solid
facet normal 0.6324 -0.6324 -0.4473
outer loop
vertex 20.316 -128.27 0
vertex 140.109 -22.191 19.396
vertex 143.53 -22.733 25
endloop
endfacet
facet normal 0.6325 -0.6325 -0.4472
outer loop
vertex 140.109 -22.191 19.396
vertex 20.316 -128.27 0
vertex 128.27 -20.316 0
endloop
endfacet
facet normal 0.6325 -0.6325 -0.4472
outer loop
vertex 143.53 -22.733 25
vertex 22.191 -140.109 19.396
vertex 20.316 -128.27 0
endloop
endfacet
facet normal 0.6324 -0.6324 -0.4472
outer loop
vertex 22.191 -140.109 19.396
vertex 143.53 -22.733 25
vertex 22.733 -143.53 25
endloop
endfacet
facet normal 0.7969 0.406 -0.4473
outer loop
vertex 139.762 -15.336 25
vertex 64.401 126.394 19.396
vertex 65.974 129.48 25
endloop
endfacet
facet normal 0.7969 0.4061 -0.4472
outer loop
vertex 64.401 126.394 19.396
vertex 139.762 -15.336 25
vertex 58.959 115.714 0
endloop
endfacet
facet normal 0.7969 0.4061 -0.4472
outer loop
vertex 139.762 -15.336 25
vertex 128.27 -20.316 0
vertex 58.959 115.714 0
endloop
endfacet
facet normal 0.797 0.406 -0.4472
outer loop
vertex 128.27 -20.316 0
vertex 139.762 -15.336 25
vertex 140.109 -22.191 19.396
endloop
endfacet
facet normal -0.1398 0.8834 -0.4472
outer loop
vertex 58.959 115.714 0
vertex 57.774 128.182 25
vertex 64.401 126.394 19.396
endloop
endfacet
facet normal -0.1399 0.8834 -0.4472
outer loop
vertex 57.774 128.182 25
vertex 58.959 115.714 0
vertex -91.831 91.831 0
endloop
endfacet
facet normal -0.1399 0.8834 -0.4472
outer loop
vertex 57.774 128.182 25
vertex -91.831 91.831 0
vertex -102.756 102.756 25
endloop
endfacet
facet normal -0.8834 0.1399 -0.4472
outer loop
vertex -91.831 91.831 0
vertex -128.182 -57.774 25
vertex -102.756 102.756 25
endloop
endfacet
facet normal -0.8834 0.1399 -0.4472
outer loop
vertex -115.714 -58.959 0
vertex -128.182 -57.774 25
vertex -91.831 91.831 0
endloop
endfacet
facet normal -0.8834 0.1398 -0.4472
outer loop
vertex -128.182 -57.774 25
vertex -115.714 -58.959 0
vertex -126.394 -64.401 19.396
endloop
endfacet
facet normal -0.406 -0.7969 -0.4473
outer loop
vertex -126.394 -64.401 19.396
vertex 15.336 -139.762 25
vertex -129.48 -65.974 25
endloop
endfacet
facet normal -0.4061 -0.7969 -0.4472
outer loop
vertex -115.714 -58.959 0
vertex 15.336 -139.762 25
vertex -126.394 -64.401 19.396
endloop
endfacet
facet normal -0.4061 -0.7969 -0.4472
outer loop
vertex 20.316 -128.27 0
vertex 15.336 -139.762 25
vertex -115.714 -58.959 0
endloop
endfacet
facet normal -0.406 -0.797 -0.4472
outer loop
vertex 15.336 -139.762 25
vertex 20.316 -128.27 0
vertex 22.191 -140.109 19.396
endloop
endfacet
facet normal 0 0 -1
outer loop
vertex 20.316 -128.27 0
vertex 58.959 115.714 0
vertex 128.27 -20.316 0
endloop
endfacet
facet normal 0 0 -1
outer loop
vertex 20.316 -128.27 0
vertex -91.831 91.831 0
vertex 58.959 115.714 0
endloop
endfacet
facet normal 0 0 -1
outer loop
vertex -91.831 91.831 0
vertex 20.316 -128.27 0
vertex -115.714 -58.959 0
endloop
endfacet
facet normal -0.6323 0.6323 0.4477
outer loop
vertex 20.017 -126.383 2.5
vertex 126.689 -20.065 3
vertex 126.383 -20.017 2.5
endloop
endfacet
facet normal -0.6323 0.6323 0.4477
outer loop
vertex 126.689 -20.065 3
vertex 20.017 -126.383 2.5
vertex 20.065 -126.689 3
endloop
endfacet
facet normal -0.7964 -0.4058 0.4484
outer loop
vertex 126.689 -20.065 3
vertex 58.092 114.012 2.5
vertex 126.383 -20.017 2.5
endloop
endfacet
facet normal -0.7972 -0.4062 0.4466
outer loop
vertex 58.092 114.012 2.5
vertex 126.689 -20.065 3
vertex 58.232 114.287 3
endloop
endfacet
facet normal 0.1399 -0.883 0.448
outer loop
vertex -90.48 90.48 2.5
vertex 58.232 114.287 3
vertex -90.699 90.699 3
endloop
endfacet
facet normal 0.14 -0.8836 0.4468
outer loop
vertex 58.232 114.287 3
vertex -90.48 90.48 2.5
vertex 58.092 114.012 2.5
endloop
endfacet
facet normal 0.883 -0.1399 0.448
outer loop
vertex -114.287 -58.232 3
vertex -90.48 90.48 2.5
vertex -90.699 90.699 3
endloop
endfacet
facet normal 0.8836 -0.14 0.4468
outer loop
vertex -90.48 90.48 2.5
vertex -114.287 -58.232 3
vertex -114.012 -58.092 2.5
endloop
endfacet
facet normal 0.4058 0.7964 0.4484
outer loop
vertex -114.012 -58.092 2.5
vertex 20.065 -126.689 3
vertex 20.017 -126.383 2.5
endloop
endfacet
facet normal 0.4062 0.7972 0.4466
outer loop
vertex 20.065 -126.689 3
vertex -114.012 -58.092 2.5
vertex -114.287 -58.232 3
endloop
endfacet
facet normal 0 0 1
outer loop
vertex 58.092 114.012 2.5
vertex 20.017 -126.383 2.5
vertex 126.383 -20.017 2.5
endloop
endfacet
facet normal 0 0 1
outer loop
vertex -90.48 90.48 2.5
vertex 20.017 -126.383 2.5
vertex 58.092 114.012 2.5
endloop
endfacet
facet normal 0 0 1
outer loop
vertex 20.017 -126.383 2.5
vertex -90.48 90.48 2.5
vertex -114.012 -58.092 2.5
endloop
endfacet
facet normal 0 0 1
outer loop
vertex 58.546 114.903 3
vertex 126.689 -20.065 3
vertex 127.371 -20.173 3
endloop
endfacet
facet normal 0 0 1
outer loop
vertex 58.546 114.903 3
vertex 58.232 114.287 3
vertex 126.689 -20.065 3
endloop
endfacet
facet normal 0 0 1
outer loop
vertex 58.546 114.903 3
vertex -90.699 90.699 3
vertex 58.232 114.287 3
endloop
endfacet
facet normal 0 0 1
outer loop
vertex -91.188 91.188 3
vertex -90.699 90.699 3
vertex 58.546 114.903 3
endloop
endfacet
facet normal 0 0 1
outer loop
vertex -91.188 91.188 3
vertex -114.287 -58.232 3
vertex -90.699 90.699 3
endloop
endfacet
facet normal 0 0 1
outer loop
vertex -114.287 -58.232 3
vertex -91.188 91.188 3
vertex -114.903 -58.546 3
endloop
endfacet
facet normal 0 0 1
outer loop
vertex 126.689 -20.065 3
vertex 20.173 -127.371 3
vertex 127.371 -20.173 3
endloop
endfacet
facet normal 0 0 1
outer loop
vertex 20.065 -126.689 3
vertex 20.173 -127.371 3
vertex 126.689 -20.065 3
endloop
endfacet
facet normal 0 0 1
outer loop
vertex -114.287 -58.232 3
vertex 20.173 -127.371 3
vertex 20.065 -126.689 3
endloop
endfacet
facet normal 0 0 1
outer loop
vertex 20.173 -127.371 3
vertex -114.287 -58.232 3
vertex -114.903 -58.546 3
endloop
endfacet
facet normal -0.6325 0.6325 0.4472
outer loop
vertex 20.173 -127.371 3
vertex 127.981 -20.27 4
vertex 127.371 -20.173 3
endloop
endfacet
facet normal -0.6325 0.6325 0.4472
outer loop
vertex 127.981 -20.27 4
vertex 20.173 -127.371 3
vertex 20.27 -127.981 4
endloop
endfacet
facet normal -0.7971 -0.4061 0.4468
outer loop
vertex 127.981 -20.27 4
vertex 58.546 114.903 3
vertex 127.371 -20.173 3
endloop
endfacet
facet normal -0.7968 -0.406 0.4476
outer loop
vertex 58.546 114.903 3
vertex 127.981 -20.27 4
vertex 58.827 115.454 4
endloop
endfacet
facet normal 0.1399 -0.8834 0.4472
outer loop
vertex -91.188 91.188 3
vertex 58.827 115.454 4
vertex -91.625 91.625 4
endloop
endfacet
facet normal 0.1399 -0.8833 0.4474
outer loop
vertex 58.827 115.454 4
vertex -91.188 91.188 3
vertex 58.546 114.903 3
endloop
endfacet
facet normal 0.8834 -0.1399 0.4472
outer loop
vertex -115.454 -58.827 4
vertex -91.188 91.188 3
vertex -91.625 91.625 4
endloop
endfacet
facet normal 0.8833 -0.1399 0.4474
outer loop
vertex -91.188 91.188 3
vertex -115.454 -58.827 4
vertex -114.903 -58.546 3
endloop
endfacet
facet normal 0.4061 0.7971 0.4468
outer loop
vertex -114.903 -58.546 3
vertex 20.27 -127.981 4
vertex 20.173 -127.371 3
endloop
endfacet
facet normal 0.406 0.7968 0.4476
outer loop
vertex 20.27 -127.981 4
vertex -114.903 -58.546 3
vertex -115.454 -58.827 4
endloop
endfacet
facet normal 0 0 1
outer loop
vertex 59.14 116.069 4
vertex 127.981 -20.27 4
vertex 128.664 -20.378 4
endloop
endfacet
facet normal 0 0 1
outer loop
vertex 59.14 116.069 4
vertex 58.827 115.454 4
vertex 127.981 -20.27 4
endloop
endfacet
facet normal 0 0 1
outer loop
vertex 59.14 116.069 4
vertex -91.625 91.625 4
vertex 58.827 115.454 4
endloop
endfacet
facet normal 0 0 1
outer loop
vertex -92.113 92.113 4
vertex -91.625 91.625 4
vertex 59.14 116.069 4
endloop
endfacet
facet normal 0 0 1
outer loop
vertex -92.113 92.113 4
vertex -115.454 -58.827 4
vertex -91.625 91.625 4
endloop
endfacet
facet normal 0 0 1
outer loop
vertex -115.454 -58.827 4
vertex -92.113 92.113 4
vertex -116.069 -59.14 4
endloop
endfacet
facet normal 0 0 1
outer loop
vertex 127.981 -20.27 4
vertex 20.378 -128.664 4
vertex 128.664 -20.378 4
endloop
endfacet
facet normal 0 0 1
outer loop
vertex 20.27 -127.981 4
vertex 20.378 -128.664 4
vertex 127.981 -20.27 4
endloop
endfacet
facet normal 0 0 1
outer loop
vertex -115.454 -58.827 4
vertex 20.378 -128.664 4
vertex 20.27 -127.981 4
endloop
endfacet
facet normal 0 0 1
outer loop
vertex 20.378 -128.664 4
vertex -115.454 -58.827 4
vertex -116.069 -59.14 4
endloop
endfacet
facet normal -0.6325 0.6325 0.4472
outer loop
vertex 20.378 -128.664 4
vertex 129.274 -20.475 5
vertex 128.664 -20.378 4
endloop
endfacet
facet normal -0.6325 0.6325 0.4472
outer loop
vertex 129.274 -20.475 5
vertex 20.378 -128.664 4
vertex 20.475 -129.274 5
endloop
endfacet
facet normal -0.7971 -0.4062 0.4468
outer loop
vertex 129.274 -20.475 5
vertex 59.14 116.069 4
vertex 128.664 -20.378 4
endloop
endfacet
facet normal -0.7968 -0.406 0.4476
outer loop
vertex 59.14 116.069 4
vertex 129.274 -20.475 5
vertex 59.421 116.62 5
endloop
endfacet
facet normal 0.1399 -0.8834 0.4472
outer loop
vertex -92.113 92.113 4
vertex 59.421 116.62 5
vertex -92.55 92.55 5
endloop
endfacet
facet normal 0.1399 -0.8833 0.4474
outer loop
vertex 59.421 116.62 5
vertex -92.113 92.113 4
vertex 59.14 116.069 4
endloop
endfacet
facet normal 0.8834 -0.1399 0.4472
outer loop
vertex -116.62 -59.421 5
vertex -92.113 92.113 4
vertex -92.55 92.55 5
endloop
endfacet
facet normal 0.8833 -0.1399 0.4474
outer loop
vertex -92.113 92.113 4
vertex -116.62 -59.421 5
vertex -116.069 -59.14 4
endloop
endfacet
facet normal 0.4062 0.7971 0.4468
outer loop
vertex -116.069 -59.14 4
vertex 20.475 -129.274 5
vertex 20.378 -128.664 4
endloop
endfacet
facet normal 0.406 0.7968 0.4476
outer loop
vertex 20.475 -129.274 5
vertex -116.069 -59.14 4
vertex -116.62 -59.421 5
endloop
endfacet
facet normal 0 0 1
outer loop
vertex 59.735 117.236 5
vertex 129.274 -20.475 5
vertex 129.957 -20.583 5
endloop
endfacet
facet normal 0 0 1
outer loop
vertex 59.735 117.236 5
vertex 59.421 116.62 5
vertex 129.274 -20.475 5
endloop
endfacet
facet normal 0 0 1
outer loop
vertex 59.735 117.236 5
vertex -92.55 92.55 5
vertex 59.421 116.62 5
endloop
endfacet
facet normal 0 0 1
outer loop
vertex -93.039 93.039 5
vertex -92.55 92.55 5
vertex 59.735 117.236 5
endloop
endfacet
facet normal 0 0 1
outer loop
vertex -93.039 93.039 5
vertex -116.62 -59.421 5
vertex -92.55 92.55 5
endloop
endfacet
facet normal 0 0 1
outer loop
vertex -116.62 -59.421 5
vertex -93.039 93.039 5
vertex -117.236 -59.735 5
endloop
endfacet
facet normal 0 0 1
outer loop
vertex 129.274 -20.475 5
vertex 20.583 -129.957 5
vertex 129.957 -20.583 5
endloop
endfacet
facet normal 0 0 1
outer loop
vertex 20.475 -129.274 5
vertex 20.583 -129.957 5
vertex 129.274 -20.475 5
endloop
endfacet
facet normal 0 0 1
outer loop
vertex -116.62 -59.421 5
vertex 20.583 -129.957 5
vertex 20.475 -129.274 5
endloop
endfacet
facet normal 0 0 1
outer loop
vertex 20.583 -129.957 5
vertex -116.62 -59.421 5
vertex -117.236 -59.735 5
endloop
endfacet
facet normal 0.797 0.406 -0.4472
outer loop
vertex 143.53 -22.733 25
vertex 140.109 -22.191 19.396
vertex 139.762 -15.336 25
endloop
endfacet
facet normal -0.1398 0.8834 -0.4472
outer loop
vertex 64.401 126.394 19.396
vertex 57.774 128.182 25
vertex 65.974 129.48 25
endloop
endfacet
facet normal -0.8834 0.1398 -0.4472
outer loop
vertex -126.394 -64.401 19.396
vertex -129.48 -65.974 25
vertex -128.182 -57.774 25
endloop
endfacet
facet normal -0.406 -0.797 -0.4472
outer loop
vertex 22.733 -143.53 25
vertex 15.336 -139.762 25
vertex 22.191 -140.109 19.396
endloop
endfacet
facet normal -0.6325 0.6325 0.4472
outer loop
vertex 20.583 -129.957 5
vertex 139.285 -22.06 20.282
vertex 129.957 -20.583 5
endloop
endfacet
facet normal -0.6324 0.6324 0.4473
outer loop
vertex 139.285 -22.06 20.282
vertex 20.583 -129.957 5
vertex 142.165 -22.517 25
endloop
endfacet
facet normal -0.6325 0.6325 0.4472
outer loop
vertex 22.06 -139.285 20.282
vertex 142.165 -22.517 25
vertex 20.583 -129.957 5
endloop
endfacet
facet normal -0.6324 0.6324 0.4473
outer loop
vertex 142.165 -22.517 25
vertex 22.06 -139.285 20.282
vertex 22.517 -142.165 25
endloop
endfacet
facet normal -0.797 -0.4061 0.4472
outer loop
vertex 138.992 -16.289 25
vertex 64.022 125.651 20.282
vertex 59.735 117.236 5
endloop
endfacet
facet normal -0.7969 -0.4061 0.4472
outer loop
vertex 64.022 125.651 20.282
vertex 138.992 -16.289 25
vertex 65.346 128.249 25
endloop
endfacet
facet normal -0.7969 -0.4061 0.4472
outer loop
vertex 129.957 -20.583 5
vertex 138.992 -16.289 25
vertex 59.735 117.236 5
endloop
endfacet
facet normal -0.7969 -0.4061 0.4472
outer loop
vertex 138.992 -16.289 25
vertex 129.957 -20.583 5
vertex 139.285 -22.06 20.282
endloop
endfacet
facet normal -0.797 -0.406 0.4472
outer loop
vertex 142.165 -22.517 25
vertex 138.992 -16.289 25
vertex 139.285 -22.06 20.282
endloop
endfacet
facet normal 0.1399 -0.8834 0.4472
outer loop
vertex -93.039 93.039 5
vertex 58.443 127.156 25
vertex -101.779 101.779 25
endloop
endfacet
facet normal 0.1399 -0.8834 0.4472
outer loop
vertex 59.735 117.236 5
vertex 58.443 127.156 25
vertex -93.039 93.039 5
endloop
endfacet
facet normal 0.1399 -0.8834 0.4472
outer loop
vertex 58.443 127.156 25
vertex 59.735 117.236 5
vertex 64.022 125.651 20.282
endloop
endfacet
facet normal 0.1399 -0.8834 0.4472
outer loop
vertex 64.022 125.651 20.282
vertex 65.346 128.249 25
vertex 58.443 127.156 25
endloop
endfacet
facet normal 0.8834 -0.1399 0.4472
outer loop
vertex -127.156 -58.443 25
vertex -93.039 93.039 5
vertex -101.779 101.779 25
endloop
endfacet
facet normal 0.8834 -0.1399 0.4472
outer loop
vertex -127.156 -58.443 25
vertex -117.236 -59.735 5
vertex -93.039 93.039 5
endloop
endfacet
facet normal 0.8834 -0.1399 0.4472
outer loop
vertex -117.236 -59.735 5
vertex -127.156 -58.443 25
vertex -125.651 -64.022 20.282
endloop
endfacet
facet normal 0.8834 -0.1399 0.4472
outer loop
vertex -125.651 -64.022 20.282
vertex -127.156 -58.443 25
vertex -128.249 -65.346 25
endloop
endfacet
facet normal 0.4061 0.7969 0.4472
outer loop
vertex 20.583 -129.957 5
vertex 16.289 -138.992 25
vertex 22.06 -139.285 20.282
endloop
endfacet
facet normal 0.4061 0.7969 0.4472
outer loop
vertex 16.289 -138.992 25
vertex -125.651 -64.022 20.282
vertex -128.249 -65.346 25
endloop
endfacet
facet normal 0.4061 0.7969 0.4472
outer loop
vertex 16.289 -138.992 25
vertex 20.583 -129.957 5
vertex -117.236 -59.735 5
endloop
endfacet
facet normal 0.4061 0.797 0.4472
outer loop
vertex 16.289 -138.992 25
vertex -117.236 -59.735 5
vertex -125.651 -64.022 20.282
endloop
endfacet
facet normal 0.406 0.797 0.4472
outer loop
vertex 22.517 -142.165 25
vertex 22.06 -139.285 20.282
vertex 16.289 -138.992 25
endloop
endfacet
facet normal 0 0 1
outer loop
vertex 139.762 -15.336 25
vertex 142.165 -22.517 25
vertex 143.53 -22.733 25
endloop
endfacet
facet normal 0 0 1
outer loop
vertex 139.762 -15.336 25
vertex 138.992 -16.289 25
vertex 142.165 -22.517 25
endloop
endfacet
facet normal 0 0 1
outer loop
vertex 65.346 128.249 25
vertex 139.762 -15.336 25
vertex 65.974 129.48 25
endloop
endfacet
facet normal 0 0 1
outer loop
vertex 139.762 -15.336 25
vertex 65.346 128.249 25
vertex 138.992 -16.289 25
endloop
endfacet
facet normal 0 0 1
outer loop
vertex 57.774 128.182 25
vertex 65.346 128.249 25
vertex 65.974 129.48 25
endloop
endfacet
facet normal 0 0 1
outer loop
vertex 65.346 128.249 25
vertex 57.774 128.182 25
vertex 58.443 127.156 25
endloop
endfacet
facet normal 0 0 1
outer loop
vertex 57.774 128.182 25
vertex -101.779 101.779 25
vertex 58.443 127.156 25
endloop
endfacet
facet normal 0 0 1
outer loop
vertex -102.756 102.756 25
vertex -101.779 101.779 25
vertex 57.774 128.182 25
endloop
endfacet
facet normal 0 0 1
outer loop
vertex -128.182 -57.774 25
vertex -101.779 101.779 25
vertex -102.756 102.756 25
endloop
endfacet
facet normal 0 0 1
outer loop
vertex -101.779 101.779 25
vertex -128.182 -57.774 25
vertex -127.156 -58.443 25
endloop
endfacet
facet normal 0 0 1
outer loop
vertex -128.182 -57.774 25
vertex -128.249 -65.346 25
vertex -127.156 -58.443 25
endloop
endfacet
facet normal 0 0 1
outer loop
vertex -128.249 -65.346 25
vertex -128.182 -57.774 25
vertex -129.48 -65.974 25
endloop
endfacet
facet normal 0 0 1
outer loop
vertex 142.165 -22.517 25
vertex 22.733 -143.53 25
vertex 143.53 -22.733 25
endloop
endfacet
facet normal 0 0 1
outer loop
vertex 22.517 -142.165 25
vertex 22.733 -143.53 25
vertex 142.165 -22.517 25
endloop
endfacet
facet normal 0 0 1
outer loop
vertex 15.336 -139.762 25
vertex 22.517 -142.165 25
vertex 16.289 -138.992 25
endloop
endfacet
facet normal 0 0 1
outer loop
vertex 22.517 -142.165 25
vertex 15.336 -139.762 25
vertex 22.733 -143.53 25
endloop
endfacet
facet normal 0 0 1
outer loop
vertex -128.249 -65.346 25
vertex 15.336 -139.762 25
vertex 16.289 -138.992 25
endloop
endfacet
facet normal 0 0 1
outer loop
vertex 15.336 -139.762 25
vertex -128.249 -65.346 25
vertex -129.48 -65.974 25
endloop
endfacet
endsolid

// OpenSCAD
/*
 * Customizable Lamp Shade - https://www.thingiverse.com/thing:2372190
 * by Dennis Hofmann - https://www.thingiverse.com/mightynozzle/about
 * created 2017-06-08
 * version v1.0
 *
 * This work is licensed under the Creative Commons - Attribution - Non-Commercial license.
 * https://creativecommons.org/licenses/by-nc/3.0/
*/


 // Parameter Section//
//------------------//

// choose the shape of the lamp shade
lamp_shape = "dodecahedron"; //[simple,sphere,flower,dodecahedron]

// [Simple, sphere and flower shape] Resolution of round shapes. You can also use this value as the number of edges of the simple shade. If you want a cube or a pyramide, set the value of 4. If you want a cylinder or a cone, set the value of 100-255. Create a star shape with the flower shape with resolution of 3-5. Minimum value for a sphere shape is 7. You can use a low resolution (e.g. 16-32) to create a low polygon style. You can create some interesting shapes with this parameter. Just try some different values!
resolution = 64; //[3:255]

// Thinner for more translucency, thicker for more stable lamp shade. Default: 1.0
shell_thickness_in_millimeter = 1.0;

// [All lamp shapes] Set the diameter of the base of the lamp shade. The base is the position, where the bulb fitting is located. This parameter is used for all lamp shapes.
lamp_shade_base_diameter_in_millimeter = 340.0; //[1:300]

// [Simple and flower shape] Set the diameter of the head of the lamp shade. The head is the top position of the lamp shade. If this value is higher or lower than the base diameter, you get a cone or pyramide. Lower value can be used for desk lamp, higher value can be used for ceiling lamp. This parameter is used for simple and flower shape.
lamp_shade_head_diameter_in_millimeter = 10.0; //[1:300]

// [Simple and flower shape] Set the height of the lamp shade. This parameter is used for simple and flower shape
lamp_shade_height_in_millimeter = 110.0; //[1:300]

// [Sphere and dodecahedron shape] Set the cut height of the head of the shape. 0 means a closed top. It is like sclicing the top of an apple with a knife. This parameter is used for sphere and dodecahedron shape.
head_cut_height_in_millimeter = 315.0; //[0:200]

// [Sphere shape only] Set the cut height from the base of the shape. It is like sclicing the bottom of an apple with a knife. This parameter is used for sphere and dodecahedron shape.
base_cut_height_in_millimeter = 10.0;  //[0:200]

// [Flower shape only] This parameter only is used for flower shape
number_of_flower_leaves = 8; //[2:64]

// Set the diameter of the bulb bracket you want to use. Add a little extra for tolerance like 2mm if you are using a outside threaded bracket + nut/ring. If you are using a threadless bracket, it depends on the material. If it is a silicone one, you can use a little smaller hole. If it is non elastic plastic, this could be a challenge. If it is to loose, you can try to glue the gap between bracket and the lamp shade. Or do some test prints of the first 5-10 layers, before printing the whole lamp shade. Use 0, if you don't need a hole.
bulb_bracket_diameter_in_millimeter = 0;
//bulb_bracket_diameter_in_millimeter = 42.0;

// This is the additional support height for the bulb bracket. Depending on the bulb bracket you are using, this extra makes the hole more stable.
bulb_bracket_support_height_in_millimeter = 2.0;

// This is the additional support width for the bulb bracket. Depending on the bulb bracket you are using, this extra makes the hole more stable.
//bulb_bracket_support_width_in_millimeter = 13.0;
bulb_bracket_support_width_in_millimeter = 0.0;

// [Dodecahedron shape only] Extra support between walls and floor
use_dodecahedron_support = true;

// Later, perhaps (see above)
//floor_wall_support_thickness_in_millimeters = 2;
//floor_wall_support_width_in_millimeters = 6;
//floor_wall_support_height_in_millimeters = 6;

/* [Hidden] */
shape_height = lamp_shade_height_in_millimeter;
base_cut = base_cut_height_in_millimeter;
head_cut = head_cut_height_in_millimeter;
shell = shell_thickness_in_millimeter;
flower_leaves = number_of_flower_leaves;
bulb_bracket_d = bulb_bracket_diameter_in_millimeter;
bulb_bracket_support_w = bulb_bracket_support_width_in_millimeter;
bulb_bracket_support_h = bulb_bracket_support_height_in_millimeter;
shape_base_outside = lamp_shade_base_diameter_in_millimeter;
shape_head_outside = lamp_shade_head_diameter_in_millimeter;

shape_base_inside = shape_base_outside - shell * 2;
shape_head_inside = shape_head_outside - shell * 2;
$fn=resolution;


 // Program Section//
//-----------------//

// Main lampshade
color("DeepSkyBlue") rotate([0,0,45]) {
    difference() {
        union() {
            // Shape part
            if (lamp_shape == "simple") {
                simple_shape();
            } else if (lamp_shape == "sphere") {
                sphere_shape();
            } else if (lamp_shape == "flower") {
                flower_shape();
            } else if (lamp_shape == "dodecahedron") {
                if (use_dodecahedron_support) {
                    dodecahedron_support();
                }
                dodecahedron_shape();
            } else {
                echo("ERROR: Invalid lamp shade: \"", lam_shade, "\"");
            }
            
            // Bulb bracket support
            cylinder(d = bulb_bracket_d + bulb_bracket_support_w * 2, h = bulb_bracket_support_h + shell, $fn=100);
        }
        // Bottom bulb bracket hole
        translate([0,0,- 0.1]) {
            cylinder(d = bulb_bracket_d, h = shell + bulb_bracket_support_h + 0.2, $fn=100);
        }
    }
}

// Dodecahedron support
// FIXME: DIRTY HACK
module dodecahedron_support() {
    dodecahedron_shape(outside=shape_base_outside, inside=shape_base_inside-3, cut=shape_base_inside-1);
    dodecahedron_shape(outside=shape_base_outside, inside=shape_base_inside-2, cut=shape_base_inside-2);
    dodecahedron_shape(outside=shape_base_outside, inside=shape_base_inside-1, cut=shape_base_inside-3);
}

 // Module Section//
//---------------//

module simple_shape() {
    difference() {
        cylinder(d1 = shape_base_outside, d2 = shape_head_outside, h = shape_height);
        translate([0, 0, shell]) {
            cylinder(d1 = shape_base_inside, d2 = shape_head_inside, h = shape_height);
        }
    }
}

module sphere_shape() {
    translate([0, 0, shape_base_outside / 2 - base_cut]) {
        difference() {
            base_cut_sphere(shape_base_outside, base_cut);
            translate([0, 0, shell / 2]) {
                base_cut_sphere(shape_base_inside, base_cut);
            }
            // Head Cut
            translate([0, 0, shape_base_outside / 2 - head_cut]) {
                cylinder(d = shape_base_outside * 2, h = head_cut);
            }
        }
    }
}

module flower_shape() {
    difference() {
        flower(shape_base_outside, shape_head_outside);
        translate([0, 0, shell]) {
            flower(shape_base_inside, shape_head_inside);
        }
    }
}

module dodecahedron_shape(outside=shape_base_outside, inside=shape_base_inside, cut=head_cut) {
    translate([0, 0, outside / 2]) {
        difference() {
            dodecahedron(outside);
            dodecahedron(inside);
            // Head Cut
            translate([0, 0, outside / 2 - cut]) {
                cylinder(d = outside * 2, h = cut + 0.1);
            }
        }
    }
}

module base_cut_sphere(size, base) {
    difference() {
        sphere(d = size);
        // Base Cut
        translate([0, 0, - size / 2]) {
            cylinder(d = size * 2, h = base);
        }
    }
}

module dodecahedron(size) {
        scale([size, size, size]) {
        intersection() {
            cube([2, 2, 1], center = true);
            intersection_for(i = [0:4]) {
                rotate([0, 0, 72 * i]) {
                    rotate([116.565, 0, 0]) {
                        cube([2, 2, 1], center = true);
                    }
                }
            }
        }
    }
}

module flower(size1, size2) {
    leaf_diameter1 = size1 * 3 / flower_leaves;
    leaf_diameter2 = size2 * 3 / flower_leaves;
    
    difference() {
        union() {
            cylinder(d1 = size1 - leaf_diameter1,, d2 = size2 - leaf_diameter2, h = shape_height, $fn=100);
            for(leaf = [0:flower_leaves]) {
                rotate([0, 0, 360 / flower_leaves * leaf]) {
                    hull() {
                        translate([(size1 - leaf_diameter1) / 2, 0, 0]) {
                            cylinder(d = leaf_diameter1, h = 0.1);
                        }
                        translate([(size2 - leaf_diameter2) / 2, 0, shape_height]) {
                            cylinder(d = leaf_diameter2, h = 0.1);
                        }
                    }
                }        
            }
        }
        translate([0, 0, shape_height]) {
            cylinder(d = size2 + 1, h = 0.2);
        }
    }
}
